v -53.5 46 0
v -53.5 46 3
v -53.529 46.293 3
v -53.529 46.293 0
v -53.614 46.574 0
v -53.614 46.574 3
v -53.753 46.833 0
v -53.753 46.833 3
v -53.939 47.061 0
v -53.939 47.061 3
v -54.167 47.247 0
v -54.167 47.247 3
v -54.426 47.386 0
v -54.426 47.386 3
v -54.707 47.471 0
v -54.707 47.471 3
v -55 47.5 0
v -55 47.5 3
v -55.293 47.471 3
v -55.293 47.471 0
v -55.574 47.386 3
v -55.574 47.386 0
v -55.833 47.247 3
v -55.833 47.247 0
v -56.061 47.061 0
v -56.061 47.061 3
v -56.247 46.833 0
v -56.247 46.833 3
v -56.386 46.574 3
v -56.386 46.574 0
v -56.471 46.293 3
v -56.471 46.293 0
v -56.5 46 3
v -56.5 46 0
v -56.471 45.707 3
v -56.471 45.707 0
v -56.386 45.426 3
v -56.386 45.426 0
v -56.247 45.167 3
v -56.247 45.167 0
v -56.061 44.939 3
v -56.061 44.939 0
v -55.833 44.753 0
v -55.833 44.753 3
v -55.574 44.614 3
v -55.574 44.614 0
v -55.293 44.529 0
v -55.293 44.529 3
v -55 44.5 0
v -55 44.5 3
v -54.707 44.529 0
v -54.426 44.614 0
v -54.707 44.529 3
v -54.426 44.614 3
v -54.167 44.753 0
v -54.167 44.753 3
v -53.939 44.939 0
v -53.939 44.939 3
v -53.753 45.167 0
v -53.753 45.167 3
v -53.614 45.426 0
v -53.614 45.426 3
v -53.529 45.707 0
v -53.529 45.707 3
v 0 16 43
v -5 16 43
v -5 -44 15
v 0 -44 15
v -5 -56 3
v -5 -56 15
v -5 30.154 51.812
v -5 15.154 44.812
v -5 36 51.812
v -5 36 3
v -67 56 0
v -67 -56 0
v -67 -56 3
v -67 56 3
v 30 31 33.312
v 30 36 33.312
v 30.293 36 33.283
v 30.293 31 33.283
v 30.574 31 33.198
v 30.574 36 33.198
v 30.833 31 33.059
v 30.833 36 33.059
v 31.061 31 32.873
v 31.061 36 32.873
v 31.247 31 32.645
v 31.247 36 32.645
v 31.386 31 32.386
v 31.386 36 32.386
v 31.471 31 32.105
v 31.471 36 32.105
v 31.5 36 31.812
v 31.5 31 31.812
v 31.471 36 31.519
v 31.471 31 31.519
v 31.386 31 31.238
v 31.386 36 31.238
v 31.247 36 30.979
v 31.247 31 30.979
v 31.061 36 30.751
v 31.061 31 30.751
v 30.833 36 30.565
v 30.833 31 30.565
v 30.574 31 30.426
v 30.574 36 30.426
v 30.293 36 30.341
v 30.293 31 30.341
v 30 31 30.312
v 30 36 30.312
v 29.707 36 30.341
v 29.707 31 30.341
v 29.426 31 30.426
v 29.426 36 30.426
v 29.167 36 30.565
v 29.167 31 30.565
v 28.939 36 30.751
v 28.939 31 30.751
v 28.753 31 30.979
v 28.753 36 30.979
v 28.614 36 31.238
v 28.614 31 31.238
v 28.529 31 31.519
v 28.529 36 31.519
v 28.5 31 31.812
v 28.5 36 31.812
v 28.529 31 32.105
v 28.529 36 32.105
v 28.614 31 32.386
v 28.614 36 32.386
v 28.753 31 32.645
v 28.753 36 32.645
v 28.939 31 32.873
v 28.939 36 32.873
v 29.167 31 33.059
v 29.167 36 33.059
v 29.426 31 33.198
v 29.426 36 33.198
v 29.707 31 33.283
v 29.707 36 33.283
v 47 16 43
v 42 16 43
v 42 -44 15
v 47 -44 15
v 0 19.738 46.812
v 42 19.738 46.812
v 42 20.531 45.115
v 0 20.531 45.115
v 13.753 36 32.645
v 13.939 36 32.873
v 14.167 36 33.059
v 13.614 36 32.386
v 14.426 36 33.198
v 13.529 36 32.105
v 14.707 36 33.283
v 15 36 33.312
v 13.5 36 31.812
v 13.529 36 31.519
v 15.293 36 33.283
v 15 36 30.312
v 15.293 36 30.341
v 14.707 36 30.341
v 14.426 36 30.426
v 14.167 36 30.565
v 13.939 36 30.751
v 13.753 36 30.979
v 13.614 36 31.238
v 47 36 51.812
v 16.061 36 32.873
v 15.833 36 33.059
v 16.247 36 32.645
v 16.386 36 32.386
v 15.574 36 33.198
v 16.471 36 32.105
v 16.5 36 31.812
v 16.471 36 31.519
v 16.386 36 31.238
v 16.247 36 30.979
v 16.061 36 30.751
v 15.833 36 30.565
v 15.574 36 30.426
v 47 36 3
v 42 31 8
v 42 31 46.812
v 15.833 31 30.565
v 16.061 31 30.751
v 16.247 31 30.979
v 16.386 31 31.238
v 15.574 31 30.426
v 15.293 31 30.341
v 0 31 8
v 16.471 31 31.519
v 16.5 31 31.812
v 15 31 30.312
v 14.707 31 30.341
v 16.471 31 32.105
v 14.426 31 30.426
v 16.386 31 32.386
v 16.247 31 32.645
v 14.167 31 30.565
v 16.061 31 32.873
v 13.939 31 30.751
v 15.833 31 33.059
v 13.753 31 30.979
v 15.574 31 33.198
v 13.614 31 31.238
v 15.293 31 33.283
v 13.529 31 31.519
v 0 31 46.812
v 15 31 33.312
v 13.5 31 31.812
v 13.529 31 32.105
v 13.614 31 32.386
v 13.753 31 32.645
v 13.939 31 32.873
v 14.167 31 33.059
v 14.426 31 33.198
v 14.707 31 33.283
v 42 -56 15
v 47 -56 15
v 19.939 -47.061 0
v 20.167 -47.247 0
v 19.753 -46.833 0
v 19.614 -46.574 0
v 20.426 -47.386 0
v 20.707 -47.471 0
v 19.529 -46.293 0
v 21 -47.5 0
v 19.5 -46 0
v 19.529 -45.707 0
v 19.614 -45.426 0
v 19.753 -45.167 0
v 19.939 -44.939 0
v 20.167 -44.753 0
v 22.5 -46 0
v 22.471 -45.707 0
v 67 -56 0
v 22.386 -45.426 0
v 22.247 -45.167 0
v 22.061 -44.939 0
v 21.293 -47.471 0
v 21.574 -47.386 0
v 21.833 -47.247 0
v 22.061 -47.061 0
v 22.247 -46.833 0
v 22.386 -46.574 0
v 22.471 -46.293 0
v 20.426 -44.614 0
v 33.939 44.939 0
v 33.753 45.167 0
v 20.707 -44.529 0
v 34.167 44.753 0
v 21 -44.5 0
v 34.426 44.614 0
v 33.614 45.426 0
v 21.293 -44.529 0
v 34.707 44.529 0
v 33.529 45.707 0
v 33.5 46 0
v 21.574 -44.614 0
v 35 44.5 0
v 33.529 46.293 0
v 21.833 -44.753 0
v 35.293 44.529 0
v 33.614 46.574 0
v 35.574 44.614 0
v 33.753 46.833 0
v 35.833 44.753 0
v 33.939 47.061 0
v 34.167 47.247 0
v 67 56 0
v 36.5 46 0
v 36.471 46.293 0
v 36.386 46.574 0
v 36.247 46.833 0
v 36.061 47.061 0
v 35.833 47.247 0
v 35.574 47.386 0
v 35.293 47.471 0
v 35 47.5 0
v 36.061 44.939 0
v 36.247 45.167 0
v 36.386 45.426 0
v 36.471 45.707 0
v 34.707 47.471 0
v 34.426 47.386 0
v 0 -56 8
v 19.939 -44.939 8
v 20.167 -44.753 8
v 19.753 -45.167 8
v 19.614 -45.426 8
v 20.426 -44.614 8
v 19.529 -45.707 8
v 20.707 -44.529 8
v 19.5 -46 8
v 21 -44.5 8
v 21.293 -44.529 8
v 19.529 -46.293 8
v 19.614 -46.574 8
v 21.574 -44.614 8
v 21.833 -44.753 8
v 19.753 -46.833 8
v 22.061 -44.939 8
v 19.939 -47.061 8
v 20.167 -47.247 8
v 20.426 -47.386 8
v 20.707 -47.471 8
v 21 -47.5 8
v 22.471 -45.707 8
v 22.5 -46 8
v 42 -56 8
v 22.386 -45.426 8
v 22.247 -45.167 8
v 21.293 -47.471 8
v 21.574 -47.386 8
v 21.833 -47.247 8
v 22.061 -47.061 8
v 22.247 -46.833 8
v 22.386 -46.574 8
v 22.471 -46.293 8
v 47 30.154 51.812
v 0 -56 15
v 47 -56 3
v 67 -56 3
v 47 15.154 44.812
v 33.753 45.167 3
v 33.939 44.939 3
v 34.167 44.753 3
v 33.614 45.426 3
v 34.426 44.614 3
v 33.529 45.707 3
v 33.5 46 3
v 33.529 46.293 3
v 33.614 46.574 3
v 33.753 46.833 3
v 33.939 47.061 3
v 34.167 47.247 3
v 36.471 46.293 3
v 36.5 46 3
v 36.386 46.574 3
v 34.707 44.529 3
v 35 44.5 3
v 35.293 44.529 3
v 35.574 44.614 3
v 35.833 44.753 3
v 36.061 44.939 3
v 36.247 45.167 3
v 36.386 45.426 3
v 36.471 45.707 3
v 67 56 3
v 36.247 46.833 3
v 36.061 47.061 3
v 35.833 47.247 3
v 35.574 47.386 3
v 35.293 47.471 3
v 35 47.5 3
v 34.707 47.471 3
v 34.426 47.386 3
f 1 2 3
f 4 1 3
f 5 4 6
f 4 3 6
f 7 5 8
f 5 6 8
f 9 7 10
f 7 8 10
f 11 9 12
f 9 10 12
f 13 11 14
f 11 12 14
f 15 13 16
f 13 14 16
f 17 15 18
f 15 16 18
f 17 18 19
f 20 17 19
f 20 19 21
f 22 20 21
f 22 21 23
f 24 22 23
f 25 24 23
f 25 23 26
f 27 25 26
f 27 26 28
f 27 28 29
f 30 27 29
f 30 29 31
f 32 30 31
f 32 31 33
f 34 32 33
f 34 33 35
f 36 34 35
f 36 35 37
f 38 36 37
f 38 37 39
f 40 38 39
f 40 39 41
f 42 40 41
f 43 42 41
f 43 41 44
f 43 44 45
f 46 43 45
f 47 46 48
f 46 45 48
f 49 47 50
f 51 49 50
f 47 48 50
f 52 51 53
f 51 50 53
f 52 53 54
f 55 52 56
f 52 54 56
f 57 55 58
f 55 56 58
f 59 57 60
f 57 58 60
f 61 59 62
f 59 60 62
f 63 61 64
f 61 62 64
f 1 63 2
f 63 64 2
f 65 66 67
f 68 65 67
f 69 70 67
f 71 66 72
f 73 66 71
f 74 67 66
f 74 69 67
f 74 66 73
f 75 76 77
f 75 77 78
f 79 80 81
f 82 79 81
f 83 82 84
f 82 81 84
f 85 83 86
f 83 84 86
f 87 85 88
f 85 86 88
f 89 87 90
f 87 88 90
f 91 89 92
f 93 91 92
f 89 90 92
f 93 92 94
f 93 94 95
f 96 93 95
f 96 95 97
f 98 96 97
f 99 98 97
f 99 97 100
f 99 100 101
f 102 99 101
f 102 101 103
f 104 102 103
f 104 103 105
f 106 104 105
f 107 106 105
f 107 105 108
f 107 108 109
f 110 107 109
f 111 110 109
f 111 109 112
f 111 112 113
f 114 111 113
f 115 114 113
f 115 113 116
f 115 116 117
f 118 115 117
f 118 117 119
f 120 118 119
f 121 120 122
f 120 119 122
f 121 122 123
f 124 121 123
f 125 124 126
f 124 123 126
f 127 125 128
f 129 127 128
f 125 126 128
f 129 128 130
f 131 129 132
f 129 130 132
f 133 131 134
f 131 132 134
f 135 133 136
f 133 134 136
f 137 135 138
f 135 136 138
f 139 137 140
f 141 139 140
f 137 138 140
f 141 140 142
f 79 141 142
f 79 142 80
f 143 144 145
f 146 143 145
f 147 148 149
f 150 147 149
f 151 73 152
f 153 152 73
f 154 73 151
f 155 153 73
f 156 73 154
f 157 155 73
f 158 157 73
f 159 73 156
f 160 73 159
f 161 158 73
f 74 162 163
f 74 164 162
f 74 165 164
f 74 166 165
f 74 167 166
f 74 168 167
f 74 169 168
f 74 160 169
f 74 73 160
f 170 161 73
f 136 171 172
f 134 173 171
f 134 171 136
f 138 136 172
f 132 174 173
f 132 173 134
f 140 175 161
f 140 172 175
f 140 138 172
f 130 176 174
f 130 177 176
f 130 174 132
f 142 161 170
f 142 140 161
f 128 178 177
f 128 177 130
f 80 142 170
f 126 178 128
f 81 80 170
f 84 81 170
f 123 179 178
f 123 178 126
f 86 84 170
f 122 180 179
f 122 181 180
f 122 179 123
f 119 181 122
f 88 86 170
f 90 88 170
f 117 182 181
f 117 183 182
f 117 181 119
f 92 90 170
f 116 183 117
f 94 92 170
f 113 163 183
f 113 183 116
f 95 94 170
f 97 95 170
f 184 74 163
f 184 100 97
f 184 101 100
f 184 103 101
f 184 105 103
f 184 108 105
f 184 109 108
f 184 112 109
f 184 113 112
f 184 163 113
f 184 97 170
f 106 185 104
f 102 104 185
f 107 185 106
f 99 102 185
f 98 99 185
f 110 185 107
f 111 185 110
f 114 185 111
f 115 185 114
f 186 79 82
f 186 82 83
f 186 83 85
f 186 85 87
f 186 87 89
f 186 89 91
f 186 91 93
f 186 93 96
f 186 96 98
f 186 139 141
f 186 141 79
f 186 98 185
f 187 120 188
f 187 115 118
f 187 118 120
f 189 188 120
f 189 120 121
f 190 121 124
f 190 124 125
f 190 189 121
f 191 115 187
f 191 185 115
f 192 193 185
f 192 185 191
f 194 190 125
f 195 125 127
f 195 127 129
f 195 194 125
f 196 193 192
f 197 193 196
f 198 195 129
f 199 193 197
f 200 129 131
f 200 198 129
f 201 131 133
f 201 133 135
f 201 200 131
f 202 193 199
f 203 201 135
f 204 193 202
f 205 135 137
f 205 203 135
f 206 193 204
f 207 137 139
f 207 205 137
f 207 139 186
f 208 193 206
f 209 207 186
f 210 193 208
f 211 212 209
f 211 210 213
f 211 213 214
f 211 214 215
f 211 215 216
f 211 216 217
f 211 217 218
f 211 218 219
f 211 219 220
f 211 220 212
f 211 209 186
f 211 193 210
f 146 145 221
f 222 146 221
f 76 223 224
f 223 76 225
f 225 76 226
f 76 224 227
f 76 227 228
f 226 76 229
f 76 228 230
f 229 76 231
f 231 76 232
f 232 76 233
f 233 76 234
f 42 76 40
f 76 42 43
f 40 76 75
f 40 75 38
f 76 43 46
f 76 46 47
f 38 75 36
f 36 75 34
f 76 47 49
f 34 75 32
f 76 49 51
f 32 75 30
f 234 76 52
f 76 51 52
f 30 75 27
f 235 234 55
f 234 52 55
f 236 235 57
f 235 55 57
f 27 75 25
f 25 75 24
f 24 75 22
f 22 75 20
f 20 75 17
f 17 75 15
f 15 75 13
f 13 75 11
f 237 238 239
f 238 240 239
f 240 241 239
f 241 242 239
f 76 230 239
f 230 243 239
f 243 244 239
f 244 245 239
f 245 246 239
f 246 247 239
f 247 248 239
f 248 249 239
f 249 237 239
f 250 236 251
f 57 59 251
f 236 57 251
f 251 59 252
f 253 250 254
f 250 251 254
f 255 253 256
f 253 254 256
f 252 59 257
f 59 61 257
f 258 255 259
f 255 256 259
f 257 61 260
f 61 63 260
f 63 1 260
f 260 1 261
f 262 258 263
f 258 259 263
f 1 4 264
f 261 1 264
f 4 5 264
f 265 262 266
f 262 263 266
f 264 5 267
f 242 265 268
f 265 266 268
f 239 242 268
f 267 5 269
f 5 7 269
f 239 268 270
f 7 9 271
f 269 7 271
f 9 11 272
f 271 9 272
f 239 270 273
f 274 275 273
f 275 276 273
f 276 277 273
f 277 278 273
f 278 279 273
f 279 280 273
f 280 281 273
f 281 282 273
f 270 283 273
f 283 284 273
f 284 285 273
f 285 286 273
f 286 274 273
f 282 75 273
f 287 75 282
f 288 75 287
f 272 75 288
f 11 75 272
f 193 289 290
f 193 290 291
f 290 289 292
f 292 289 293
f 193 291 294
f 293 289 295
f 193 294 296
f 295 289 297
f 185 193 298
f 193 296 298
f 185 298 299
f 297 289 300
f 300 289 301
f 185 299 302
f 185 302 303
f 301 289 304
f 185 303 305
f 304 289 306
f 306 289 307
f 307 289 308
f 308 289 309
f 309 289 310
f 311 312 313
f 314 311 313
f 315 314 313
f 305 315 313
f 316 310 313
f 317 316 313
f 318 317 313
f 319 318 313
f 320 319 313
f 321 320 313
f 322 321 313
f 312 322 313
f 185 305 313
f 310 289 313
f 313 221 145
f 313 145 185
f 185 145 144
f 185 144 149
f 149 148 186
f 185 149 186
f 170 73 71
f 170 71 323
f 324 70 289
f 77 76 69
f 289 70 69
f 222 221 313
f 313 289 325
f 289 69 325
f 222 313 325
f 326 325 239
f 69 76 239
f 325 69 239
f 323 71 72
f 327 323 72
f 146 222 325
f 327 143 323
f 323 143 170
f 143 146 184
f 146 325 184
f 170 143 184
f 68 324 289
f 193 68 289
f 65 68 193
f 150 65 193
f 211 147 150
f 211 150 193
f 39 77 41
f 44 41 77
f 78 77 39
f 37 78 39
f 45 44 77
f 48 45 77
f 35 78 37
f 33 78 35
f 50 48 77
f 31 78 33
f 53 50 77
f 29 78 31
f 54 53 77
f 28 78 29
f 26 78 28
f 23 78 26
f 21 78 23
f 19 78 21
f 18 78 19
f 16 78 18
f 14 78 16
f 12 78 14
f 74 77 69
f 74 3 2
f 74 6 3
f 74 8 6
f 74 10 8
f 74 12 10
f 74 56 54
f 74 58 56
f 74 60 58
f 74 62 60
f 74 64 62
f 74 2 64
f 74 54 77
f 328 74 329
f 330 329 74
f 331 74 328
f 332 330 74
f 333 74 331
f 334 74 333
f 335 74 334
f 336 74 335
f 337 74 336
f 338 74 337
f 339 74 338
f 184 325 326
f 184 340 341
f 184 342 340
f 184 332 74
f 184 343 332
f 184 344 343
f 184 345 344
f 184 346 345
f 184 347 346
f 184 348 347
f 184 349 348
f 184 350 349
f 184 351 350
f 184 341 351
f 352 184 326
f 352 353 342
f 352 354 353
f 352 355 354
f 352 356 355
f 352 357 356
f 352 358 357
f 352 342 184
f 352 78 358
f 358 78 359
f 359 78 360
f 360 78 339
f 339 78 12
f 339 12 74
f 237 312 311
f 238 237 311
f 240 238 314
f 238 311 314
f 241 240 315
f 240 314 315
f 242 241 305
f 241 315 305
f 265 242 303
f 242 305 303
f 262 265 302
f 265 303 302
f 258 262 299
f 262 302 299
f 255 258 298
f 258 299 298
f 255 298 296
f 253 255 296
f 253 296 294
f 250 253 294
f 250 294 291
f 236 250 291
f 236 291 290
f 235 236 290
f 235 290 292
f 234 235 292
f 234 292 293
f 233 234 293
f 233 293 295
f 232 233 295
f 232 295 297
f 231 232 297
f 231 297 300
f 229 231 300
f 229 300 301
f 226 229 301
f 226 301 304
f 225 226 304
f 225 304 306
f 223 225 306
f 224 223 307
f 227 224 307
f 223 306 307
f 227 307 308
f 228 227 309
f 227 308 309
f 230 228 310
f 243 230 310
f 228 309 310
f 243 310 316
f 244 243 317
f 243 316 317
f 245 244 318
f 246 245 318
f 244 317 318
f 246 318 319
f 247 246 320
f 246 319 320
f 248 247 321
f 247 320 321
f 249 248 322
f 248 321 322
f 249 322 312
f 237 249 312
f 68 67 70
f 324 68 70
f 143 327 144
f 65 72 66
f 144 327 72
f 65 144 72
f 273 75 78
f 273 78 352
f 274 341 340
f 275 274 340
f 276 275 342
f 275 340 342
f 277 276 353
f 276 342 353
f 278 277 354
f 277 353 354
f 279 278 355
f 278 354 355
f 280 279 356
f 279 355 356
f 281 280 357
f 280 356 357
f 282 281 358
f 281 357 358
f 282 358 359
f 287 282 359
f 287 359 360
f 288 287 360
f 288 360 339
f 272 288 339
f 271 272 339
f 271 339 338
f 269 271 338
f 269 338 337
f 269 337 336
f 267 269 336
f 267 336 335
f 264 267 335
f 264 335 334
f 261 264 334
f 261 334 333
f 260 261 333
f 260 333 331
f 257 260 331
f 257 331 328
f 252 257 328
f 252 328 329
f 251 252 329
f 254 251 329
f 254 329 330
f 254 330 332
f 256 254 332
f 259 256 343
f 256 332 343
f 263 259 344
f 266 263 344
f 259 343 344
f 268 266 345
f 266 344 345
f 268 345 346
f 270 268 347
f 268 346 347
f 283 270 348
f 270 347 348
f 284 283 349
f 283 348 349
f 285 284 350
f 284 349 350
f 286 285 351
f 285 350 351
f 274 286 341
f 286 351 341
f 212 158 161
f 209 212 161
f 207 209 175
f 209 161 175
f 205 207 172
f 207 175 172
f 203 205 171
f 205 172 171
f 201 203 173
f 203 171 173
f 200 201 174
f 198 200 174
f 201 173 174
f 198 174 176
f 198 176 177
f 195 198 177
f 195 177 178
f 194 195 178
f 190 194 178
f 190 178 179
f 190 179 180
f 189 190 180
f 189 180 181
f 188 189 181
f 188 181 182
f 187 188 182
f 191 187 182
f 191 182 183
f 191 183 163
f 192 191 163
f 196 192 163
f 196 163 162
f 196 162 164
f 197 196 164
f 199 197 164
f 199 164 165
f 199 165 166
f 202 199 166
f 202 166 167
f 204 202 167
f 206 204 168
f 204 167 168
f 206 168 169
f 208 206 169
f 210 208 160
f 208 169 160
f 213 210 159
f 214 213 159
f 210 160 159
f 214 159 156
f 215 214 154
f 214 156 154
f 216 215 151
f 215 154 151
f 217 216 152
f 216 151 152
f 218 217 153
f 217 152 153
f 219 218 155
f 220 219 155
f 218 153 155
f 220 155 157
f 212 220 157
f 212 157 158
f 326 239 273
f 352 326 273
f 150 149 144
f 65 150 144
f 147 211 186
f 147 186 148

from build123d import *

# Parameters (mm, degrees)
CROQUIS1_W              = 134
CROQUIS1_H              = 112
SALIENTE_EXTRUIR1_DEPTH = 3
CROQUIS2_W              = 52
CROQUIS2_H              = 92
SALIENTE_EXTRUIR2_DEPTH = 48.812
CORTAR_EXTRUIR1_DEPTH   = 105.902256144
VACIADO1_DEPTH          = 42
CROQUIS4_W              = 52
CROQUIS4_H              = 5
SALIENTE_EXTRUIR3_DEPTH = 90
CROQUIS5_R              = 1.5
CORTAR_EXTRUIR2_DEPTH   = 90
CROQUIS6_R              = 1.5
CORTAR_EXTRUIR3_DEPTH   = 90


# Read off the part's stored shape, not the designer's step: Vaciado1
with BuildPart() as part:
    # Croquis1 → Saliente-Extruir1 (new body)
    with BuildSketch(Plane.XY):
        Rectangle(CROQUIS1_W, CROQUIS1_H)
    extrude(amount=SALIENTE_EXTRUIR1_DEPTH)

    # Croquis2 → Saliente-Extruir2 (add)
    with BuildSketch(Plane.XY.offset(3)):
        with Locations((21, -10)):
            Rectangle(CROQUIS2_W, CROQUIS2_H)
    extrude(amount=SALIENTE_EXTRUIR2_DEPTH)

    # Croquis3 → Cortar-Extruir1 (cut, through all)
    with BuildSketch(Plane.ZY.offset(5)):
        Polygon((51.812, -56), (51.812, 30.154), (44.811949005, 15.153963498), (43.00020398, 16.000146009), (15, -44), (15, -56), align=None)
    extrude(amount=-CORTAR_EXTRUIR1_DEPTH, mode=Mode.SUBTRACT)

    # Vaciado1 outline → Vaciado1 (cut)
    with BuildSketch(Plane.YZ):
        Polygon((-56, 5), (31, 5), (31, 46.812), (19.738299384, 46.812), (20.531058004, 45.114639836), (16.000146009, 43.00020398), (-44, 15), (-56, 15), align=None)
    extrude(amount=VACIADO1_DEPTH, mode=Mode.SUBTRACT)

    # Croquis4 → Saliente-Extruir3 (add)
    with BuildSketch(Plane.XZ.offset(56)):
        with Locations((21, 5.5)):
            Rectangle(CROQUIS4_W, CROQUIS4_H)
    extrude(amount=-SALIENTE_EXTRUIR3_DEPTH)

    # Croquis5 → Cortar-Extruir2 (cut)
    with BuildSketch(Plane.XY.offset(8)):
        with Locations((21, -46)):
            Circle(CROQUIS5_R)
        with Locations((-55, 46)):
            Circle(CROQUIS5_R)
        with Locations((35, 46)):
            Circle(CROQUIS5_R)
    extrude(amount=-CORTAR_EXTRUIR2_DEPTH, mode=Mode.SUBTRACT)

    # Croquis6 → Cortar-Extruir3 (cut)
    with BuildSketch(Plane(origin=(0, 36, 0), x_dir=(1, 0, 0), z_dir=(0, 1, 0))):
        with Locations(Location((30, -31.812, 0), (0, 0, 270))):
            Circle(CROQUIS6_R)
        with Locations(Location((15, -31.812, 0), (0, 0, 270))):
            Circle(CROQUIS6_R)
    extrude(amount=-CORTAR_EXTRUIR3_DEPTH, mode=Mode.SUBTRACT)


solid = part.part
